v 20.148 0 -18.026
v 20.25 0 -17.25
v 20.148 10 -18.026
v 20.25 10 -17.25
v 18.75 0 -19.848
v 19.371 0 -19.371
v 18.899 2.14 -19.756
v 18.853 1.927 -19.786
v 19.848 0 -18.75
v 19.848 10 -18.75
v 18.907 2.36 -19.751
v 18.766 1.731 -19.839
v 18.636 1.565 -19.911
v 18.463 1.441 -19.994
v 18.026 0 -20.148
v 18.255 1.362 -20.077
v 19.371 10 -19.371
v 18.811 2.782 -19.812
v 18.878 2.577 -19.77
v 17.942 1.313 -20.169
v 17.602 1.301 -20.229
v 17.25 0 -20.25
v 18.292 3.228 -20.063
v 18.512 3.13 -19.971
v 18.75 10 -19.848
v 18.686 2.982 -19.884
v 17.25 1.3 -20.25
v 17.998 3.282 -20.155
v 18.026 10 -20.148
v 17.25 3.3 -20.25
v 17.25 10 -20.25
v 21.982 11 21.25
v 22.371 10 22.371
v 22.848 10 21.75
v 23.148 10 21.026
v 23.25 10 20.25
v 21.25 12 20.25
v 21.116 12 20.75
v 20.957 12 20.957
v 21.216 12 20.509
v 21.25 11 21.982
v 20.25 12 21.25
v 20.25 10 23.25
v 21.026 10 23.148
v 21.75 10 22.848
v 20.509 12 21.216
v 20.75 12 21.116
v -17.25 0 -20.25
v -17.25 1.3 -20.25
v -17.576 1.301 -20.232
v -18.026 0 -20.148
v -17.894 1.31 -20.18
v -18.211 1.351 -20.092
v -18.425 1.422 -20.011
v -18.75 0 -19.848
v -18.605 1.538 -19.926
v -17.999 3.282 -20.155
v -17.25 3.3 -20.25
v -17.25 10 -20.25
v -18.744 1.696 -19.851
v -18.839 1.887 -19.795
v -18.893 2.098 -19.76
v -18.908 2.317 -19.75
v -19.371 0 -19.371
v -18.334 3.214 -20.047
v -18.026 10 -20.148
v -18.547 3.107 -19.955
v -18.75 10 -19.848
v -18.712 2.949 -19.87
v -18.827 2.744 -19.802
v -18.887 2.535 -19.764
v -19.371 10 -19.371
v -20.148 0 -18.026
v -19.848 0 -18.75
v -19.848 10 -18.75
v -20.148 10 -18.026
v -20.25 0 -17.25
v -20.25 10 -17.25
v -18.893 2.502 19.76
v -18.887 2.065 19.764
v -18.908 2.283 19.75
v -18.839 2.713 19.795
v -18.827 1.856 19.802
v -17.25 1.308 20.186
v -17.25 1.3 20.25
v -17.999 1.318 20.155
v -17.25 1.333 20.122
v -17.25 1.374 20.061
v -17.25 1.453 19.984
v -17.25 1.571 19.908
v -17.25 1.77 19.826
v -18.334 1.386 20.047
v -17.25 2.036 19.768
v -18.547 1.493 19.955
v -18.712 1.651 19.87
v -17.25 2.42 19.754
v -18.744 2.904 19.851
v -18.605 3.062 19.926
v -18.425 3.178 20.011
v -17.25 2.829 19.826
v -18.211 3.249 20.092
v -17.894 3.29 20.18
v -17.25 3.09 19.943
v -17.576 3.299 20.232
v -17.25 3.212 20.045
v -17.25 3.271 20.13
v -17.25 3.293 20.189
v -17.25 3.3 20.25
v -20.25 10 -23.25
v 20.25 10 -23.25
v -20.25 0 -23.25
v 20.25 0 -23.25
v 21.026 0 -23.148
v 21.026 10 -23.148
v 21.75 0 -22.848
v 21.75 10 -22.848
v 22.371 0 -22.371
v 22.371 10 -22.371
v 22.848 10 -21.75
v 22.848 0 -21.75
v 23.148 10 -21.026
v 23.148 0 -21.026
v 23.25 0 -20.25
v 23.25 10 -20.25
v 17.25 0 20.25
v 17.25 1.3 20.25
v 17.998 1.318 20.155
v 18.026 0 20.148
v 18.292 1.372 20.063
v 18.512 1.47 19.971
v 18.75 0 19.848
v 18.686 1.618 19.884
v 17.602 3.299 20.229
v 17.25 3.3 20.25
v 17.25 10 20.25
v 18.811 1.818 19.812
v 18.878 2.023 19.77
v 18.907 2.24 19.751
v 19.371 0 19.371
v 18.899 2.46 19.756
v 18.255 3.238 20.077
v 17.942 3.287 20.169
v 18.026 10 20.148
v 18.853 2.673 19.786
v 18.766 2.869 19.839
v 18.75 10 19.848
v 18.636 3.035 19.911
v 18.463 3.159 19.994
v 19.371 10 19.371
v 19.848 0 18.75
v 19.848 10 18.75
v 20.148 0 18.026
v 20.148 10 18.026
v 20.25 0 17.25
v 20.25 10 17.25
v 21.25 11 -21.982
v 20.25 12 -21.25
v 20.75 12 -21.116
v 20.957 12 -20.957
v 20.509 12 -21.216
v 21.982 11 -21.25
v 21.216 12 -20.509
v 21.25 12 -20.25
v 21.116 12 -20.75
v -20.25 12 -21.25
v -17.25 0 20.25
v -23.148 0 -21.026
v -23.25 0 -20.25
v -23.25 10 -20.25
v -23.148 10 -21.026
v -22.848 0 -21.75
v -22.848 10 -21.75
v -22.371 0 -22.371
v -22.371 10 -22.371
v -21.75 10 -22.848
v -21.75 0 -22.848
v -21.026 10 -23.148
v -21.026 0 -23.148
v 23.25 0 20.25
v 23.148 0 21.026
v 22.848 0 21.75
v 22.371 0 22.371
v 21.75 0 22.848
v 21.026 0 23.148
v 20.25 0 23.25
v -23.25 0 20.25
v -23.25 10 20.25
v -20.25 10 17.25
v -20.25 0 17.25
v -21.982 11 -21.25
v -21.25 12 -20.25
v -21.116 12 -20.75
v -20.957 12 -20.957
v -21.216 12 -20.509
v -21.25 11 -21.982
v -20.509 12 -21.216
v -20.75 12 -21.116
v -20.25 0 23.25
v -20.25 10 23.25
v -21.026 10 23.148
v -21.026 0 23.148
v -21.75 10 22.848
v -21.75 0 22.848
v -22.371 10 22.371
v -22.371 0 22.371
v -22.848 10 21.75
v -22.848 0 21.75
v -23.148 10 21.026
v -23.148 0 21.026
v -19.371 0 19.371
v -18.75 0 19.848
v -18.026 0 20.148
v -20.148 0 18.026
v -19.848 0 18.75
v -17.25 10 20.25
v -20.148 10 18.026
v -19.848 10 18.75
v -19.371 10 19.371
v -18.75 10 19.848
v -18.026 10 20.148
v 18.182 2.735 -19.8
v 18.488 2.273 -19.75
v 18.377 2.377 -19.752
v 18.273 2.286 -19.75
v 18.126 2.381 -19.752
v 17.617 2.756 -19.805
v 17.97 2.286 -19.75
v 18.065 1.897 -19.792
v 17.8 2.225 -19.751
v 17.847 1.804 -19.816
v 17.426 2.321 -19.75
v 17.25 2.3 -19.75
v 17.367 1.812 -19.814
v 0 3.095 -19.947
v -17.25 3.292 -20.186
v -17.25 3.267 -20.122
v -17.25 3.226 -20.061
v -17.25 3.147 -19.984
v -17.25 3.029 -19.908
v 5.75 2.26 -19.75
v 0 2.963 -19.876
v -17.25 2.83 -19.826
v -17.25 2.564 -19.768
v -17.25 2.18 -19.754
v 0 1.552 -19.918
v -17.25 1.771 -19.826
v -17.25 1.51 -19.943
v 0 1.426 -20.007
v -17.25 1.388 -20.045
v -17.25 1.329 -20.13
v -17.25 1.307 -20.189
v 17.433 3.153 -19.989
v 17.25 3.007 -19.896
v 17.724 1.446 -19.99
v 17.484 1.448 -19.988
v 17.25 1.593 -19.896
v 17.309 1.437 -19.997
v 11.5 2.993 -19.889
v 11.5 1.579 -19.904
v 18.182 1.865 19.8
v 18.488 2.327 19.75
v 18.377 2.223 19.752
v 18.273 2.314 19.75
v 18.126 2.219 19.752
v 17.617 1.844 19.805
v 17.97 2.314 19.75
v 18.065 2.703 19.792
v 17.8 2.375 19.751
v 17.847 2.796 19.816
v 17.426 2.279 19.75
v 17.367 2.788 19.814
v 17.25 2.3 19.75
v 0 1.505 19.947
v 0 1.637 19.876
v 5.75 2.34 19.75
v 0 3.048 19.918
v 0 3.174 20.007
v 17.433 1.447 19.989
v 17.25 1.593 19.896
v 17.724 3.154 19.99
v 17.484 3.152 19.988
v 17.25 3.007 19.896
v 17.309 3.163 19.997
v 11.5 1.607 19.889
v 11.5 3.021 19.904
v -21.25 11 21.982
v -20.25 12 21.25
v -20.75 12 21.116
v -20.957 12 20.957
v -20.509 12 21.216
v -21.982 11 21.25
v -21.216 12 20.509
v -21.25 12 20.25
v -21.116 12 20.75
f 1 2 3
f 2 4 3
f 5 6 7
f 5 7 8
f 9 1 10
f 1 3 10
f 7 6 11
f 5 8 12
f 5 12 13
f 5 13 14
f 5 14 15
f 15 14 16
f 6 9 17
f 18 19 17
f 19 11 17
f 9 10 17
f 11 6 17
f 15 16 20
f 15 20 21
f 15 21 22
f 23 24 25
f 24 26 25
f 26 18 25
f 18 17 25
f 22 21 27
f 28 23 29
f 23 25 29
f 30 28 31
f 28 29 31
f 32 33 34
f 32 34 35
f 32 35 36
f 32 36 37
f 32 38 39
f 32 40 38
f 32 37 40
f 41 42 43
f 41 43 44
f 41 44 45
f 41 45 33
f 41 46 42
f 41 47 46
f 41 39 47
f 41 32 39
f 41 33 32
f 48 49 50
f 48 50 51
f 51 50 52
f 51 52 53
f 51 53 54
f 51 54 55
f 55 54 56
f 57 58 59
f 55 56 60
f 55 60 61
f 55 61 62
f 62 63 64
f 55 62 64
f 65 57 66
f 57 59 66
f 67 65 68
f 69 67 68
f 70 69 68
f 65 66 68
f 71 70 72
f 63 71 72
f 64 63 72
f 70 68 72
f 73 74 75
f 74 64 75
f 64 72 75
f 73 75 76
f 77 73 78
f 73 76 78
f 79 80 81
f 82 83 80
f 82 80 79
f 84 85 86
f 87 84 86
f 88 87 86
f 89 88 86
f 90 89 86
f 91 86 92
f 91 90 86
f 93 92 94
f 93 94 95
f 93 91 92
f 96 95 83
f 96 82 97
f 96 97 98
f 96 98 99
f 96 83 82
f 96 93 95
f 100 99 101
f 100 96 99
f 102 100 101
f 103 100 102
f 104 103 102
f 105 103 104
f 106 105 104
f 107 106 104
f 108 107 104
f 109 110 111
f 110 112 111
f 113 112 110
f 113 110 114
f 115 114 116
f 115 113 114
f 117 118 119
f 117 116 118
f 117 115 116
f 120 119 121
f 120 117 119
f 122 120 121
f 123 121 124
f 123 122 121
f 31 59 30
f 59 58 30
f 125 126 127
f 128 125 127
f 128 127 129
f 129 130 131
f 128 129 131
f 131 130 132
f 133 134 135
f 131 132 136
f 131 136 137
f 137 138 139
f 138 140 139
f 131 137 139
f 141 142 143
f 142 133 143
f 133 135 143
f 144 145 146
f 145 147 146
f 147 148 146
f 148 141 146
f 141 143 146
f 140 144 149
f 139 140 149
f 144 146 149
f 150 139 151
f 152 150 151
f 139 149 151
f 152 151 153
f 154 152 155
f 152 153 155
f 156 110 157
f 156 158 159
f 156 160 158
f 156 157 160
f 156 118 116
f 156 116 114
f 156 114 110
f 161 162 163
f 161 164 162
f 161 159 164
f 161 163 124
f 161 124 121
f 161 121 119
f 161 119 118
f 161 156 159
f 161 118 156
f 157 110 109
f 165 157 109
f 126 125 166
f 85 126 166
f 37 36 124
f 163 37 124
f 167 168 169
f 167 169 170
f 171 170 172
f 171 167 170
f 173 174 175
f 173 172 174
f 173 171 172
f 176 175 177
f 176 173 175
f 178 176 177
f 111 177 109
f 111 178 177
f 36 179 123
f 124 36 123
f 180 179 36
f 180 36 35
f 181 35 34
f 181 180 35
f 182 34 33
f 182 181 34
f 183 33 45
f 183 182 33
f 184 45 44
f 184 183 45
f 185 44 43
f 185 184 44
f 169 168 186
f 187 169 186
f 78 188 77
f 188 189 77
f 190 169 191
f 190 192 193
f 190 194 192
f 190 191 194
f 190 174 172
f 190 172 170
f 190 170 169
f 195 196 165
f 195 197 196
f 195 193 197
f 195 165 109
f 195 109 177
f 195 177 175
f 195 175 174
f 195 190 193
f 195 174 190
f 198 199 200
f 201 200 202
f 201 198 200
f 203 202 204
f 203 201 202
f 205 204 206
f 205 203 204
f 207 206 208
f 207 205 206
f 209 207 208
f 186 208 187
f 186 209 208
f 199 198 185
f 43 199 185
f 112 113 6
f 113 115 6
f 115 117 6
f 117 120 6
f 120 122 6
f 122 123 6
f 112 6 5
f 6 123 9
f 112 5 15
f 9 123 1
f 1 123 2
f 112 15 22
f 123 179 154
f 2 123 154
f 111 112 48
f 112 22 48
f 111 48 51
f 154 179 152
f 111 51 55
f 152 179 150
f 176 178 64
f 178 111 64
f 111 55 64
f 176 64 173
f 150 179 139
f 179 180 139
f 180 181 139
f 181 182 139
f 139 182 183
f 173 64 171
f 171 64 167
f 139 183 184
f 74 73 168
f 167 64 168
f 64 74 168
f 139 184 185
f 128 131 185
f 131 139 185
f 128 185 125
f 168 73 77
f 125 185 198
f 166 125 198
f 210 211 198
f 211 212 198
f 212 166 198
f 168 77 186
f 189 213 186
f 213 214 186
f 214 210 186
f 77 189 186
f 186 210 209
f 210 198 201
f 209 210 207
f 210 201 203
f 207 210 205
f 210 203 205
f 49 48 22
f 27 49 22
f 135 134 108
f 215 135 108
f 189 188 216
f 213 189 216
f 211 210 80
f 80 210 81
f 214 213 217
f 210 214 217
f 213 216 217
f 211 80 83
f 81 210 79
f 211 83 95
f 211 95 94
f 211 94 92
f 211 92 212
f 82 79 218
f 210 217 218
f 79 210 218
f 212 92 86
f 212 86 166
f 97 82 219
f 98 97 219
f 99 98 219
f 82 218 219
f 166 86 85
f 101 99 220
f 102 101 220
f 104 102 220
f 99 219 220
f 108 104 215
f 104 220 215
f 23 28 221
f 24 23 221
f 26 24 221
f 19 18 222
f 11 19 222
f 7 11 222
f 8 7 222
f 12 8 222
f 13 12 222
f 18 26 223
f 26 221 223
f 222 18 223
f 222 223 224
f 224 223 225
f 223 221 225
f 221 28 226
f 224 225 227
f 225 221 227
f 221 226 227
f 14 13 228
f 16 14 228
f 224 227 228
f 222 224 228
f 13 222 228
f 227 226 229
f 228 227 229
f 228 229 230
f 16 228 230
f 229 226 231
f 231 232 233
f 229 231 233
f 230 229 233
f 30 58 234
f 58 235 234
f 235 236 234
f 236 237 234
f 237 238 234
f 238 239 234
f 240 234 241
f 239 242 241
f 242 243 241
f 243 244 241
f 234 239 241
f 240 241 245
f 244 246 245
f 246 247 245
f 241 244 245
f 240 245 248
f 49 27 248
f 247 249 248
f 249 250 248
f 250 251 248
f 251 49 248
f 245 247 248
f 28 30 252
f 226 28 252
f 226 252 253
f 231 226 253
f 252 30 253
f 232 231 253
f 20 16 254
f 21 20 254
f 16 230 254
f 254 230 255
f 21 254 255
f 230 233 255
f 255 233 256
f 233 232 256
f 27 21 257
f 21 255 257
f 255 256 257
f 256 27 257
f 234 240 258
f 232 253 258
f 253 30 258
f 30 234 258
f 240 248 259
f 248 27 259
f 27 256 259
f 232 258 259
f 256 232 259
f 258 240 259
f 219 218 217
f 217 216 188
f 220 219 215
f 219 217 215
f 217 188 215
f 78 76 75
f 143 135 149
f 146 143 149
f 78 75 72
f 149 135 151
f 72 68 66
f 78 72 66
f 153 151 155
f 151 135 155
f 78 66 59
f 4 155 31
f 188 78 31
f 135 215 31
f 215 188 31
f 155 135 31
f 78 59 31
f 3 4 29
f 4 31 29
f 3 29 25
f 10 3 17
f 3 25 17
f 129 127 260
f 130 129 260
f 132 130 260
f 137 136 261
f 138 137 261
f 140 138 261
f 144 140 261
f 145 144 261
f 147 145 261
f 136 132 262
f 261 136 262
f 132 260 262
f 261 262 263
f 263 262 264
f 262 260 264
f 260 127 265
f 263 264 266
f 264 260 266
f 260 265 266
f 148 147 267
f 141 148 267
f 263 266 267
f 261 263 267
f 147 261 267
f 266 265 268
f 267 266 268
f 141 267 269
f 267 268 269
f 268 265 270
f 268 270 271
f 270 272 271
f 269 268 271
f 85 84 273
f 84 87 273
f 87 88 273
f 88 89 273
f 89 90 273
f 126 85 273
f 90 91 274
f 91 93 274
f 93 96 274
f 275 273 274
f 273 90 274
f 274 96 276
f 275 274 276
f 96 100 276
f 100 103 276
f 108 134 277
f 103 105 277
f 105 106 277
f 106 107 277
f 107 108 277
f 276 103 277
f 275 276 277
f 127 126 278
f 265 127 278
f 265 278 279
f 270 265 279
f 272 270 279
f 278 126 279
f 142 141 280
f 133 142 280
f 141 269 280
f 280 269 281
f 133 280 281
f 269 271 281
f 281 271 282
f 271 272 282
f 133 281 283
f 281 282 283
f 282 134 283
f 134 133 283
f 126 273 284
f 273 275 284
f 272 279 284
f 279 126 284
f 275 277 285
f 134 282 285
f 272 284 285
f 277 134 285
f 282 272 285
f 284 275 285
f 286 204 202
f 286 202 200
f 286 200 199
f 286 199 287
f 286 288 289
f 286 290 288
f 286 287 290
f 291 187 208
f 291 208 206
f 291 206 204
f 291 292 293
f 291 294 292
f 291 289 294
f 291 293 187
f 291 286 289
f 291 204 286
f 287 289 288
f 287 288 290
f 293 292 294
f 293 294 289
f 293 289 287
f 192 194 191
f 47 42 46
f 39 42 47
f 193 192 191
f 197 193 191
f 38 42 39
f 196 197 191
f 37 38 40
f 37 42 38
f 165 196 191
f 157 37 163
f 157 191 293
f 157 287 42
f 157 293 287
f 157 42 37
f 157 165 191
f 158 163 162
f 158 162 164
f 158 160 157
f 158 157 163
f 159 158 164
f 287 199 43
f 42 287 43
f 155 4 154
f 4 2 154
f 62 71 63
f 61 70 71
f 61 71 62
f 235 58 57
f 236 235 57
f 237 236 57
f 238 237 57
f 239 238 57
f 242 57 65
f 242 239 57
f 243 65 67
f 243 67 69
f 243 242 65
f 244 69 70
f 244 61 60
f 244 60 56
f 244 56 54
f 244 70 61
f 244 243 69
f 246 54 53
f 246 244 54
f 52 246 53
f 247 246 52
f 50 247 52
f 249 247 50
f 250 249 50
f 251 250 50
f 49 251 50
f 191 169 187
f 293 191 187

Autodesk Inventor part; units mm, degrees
ref_plane "YZ Plane" through (0, 0, 0) normal (1, 0, 0) x (0, 1, 0)
ref_plane "XZ Plane" through (0, 0, 0) normal (0, 1, 0) x (-1, 0, 0)
ref_plane "XY Plane" through (0, 0, 0) normal (0, 0, 1) x (1, 0, 0)
sketch "Sketch1" plane through (0, 0, 0) normal (0, 1, 0) x (-1, 0, 0)
  line L0 (20.25, -20.25) -> (-20.25, -20.25)
  line L1 (-20.25, -20.25) -> (-20.25, 20.25)
  line L2 (-20.25, 20.25) -> (20.25, 20.25)
  line L3 (20.25, 20.25) -> (20.25, -20.25)
  line L4 (23.25, 23.25) -> (-23.25, 23.25)
  line L5 (-23.25, 23.25) -> (-23.25, -23.25)
  line L6 (-23.25, -23.25) -> (23.25, -23.25)
  line L7 (23.25, -23.25) -> (23.25, 23.25)
  point P0 (0, 0)
  point P1 (20.25, 0)
  point P2 (0, -20.25)
  point P3 (23.25, 0)
  point P4 (0, -23.25)
  dimension "d0" = 40.5
  dimension "d1" = 40.5
  dimension "d2" = 46.5
  dimension "d3" = 46.5
extrude "Extrusion1" add sketch "Sketch1" along normal blind 10
fillet "Fillet1" radius 3 8 edges at (-23.25, 5, 23.25) (23.25, 5, 23.25) (23.25, 5, -23.25) (-23.25, 5, -23.25) (-20.25, 5, -20.25) (-20.25, 5, 20.25) (20.25, 5, 20.25) (20.25, 5, -20.25)
ref_plane "Arbeitsebene3" through (-17.25, 0, -20.25) normal (1, 0, 0) x (0, 1, 0)
sketch "Skizze10" plane through (0, 10, 0) normal (0, 1, 0) x (1, 0, 0)
  line L0 (20.25, 23.25) -> (-20.25, 23.25) projected
  arc A0 (-20.25, 23.25) -> (-23.25, 20.25) centre (-20.25, 20.25) ccw projected
  line L1 (-23.25, 20.25) -> (-23.25, -20.25) projected
  arc A1 (-23.25, -20.25) -> (-20.25, -23.25) centre (-20.25, -20.25) ccw projected
  line L2 (-20.25, -23.25) -> (20.25, -23.25) projected
  arc A2 (20.25, -23.25) -> (23.25, -20.25) centre (20.25, -20.25) ccw projected
  line L3 (23.25, -20.25) -> (23.25, 20.25) projected
  arc A3 (23.25, 20.25) -> (20.25, 23.25) centre (20.25, 20.25) ccw projected
  line L4 (-20.25, 23.25) -> (20.25, 23.25)
  line L5 (23.25, 20.25) -> (23.25, -20.25)
  line L6 (20.25, -23.25) -> (-20.25, -23.25)
  line L7 (-23.25, -20.25) -> (-23.25, 20.25)
  arc A4 (-20.25, 23.25) -> (-23.25, 20.25) centre (-20.25, 20.25) ccw
  arc A5 (23.25, 20.25) -> (20.25, 23.25) centre (20.25, 20.25) ccw
  arc A6 (20.25, -23.25) -> (23.25, -20.25) centre (20.25, -20.25) ccw
  arc A7 (-23.25, -20.25) -> (-20.25, -23.25) centre (-20.25, -20.25) ccw
  line L8 (-20.25, -23.25) -> (20.25, -23.25)
  point P0 (0, 0)
extrude "Extrusion6" add sketch "Skizze10" along normal blind 2
sketch "Skizze9" plane through (-17.25, 0, -20.25) normal (1, 0, 0) x (0, 1, 0)
  line L0 (12, 0) -> (0, 0) construction
  line L1 (6.2, 0) -> (6.2, 0.8787) construction
  line L2 (3.3, 0) -> (1.3, 0)
  line L3 (10, 3) -> (10, 37.5) projected
  line L4 (10, 20.25) -> (0, 20.25)
  line L5 (10, 40.5) -> (0, 40.5) construction
  ellipse E0 centre (2.3, 0) end of major axis (1.3, 0) minor radius 0.5
  line L6 (3.3, 0) -> (1.3, 0)
  line L7 (10, 40.5) -> (0, 40.5) construction
  line L8 (3.3, 40.5) -> (1.3, 40.5)
  ellipse E1 centre (2.3, 40.5) end of major axis (1.3, 40.5) minor radius 0.5
  point P0 (4.6, 0)
  point P1 (10, 0)
  point P2 (6.2, 3)
  point P3 (6.2, 15.294)
  point P4 (2.3, 0.5)
  dimension "d51" = 1.6
  dimension "d52" = 2.3
  dimension "d53" = 1
  dimension "d64" = 0.5
chamfer "Fasen1" distance 2 angle 45 8 edges at (-23.25, 12, 0) (-22.3713, 12, 22.3713) (0, 12, 23.25) (22.3713, 12, 22.3713) (23.25, 12, 0) (22.3713, 12, -22.3713) (0, 12, -23.25) (-22.3713, 12, -22.3713)
extrude "Extrusion7" add sketch "Skizze9" along normal blind 37.5 and the other way blind 5 contours L2 E0 | E1 L8 picked at (2.2882, 0.1666) picked at (2.3118, 40.3334)
properties part number "IMU_mount_cover"
